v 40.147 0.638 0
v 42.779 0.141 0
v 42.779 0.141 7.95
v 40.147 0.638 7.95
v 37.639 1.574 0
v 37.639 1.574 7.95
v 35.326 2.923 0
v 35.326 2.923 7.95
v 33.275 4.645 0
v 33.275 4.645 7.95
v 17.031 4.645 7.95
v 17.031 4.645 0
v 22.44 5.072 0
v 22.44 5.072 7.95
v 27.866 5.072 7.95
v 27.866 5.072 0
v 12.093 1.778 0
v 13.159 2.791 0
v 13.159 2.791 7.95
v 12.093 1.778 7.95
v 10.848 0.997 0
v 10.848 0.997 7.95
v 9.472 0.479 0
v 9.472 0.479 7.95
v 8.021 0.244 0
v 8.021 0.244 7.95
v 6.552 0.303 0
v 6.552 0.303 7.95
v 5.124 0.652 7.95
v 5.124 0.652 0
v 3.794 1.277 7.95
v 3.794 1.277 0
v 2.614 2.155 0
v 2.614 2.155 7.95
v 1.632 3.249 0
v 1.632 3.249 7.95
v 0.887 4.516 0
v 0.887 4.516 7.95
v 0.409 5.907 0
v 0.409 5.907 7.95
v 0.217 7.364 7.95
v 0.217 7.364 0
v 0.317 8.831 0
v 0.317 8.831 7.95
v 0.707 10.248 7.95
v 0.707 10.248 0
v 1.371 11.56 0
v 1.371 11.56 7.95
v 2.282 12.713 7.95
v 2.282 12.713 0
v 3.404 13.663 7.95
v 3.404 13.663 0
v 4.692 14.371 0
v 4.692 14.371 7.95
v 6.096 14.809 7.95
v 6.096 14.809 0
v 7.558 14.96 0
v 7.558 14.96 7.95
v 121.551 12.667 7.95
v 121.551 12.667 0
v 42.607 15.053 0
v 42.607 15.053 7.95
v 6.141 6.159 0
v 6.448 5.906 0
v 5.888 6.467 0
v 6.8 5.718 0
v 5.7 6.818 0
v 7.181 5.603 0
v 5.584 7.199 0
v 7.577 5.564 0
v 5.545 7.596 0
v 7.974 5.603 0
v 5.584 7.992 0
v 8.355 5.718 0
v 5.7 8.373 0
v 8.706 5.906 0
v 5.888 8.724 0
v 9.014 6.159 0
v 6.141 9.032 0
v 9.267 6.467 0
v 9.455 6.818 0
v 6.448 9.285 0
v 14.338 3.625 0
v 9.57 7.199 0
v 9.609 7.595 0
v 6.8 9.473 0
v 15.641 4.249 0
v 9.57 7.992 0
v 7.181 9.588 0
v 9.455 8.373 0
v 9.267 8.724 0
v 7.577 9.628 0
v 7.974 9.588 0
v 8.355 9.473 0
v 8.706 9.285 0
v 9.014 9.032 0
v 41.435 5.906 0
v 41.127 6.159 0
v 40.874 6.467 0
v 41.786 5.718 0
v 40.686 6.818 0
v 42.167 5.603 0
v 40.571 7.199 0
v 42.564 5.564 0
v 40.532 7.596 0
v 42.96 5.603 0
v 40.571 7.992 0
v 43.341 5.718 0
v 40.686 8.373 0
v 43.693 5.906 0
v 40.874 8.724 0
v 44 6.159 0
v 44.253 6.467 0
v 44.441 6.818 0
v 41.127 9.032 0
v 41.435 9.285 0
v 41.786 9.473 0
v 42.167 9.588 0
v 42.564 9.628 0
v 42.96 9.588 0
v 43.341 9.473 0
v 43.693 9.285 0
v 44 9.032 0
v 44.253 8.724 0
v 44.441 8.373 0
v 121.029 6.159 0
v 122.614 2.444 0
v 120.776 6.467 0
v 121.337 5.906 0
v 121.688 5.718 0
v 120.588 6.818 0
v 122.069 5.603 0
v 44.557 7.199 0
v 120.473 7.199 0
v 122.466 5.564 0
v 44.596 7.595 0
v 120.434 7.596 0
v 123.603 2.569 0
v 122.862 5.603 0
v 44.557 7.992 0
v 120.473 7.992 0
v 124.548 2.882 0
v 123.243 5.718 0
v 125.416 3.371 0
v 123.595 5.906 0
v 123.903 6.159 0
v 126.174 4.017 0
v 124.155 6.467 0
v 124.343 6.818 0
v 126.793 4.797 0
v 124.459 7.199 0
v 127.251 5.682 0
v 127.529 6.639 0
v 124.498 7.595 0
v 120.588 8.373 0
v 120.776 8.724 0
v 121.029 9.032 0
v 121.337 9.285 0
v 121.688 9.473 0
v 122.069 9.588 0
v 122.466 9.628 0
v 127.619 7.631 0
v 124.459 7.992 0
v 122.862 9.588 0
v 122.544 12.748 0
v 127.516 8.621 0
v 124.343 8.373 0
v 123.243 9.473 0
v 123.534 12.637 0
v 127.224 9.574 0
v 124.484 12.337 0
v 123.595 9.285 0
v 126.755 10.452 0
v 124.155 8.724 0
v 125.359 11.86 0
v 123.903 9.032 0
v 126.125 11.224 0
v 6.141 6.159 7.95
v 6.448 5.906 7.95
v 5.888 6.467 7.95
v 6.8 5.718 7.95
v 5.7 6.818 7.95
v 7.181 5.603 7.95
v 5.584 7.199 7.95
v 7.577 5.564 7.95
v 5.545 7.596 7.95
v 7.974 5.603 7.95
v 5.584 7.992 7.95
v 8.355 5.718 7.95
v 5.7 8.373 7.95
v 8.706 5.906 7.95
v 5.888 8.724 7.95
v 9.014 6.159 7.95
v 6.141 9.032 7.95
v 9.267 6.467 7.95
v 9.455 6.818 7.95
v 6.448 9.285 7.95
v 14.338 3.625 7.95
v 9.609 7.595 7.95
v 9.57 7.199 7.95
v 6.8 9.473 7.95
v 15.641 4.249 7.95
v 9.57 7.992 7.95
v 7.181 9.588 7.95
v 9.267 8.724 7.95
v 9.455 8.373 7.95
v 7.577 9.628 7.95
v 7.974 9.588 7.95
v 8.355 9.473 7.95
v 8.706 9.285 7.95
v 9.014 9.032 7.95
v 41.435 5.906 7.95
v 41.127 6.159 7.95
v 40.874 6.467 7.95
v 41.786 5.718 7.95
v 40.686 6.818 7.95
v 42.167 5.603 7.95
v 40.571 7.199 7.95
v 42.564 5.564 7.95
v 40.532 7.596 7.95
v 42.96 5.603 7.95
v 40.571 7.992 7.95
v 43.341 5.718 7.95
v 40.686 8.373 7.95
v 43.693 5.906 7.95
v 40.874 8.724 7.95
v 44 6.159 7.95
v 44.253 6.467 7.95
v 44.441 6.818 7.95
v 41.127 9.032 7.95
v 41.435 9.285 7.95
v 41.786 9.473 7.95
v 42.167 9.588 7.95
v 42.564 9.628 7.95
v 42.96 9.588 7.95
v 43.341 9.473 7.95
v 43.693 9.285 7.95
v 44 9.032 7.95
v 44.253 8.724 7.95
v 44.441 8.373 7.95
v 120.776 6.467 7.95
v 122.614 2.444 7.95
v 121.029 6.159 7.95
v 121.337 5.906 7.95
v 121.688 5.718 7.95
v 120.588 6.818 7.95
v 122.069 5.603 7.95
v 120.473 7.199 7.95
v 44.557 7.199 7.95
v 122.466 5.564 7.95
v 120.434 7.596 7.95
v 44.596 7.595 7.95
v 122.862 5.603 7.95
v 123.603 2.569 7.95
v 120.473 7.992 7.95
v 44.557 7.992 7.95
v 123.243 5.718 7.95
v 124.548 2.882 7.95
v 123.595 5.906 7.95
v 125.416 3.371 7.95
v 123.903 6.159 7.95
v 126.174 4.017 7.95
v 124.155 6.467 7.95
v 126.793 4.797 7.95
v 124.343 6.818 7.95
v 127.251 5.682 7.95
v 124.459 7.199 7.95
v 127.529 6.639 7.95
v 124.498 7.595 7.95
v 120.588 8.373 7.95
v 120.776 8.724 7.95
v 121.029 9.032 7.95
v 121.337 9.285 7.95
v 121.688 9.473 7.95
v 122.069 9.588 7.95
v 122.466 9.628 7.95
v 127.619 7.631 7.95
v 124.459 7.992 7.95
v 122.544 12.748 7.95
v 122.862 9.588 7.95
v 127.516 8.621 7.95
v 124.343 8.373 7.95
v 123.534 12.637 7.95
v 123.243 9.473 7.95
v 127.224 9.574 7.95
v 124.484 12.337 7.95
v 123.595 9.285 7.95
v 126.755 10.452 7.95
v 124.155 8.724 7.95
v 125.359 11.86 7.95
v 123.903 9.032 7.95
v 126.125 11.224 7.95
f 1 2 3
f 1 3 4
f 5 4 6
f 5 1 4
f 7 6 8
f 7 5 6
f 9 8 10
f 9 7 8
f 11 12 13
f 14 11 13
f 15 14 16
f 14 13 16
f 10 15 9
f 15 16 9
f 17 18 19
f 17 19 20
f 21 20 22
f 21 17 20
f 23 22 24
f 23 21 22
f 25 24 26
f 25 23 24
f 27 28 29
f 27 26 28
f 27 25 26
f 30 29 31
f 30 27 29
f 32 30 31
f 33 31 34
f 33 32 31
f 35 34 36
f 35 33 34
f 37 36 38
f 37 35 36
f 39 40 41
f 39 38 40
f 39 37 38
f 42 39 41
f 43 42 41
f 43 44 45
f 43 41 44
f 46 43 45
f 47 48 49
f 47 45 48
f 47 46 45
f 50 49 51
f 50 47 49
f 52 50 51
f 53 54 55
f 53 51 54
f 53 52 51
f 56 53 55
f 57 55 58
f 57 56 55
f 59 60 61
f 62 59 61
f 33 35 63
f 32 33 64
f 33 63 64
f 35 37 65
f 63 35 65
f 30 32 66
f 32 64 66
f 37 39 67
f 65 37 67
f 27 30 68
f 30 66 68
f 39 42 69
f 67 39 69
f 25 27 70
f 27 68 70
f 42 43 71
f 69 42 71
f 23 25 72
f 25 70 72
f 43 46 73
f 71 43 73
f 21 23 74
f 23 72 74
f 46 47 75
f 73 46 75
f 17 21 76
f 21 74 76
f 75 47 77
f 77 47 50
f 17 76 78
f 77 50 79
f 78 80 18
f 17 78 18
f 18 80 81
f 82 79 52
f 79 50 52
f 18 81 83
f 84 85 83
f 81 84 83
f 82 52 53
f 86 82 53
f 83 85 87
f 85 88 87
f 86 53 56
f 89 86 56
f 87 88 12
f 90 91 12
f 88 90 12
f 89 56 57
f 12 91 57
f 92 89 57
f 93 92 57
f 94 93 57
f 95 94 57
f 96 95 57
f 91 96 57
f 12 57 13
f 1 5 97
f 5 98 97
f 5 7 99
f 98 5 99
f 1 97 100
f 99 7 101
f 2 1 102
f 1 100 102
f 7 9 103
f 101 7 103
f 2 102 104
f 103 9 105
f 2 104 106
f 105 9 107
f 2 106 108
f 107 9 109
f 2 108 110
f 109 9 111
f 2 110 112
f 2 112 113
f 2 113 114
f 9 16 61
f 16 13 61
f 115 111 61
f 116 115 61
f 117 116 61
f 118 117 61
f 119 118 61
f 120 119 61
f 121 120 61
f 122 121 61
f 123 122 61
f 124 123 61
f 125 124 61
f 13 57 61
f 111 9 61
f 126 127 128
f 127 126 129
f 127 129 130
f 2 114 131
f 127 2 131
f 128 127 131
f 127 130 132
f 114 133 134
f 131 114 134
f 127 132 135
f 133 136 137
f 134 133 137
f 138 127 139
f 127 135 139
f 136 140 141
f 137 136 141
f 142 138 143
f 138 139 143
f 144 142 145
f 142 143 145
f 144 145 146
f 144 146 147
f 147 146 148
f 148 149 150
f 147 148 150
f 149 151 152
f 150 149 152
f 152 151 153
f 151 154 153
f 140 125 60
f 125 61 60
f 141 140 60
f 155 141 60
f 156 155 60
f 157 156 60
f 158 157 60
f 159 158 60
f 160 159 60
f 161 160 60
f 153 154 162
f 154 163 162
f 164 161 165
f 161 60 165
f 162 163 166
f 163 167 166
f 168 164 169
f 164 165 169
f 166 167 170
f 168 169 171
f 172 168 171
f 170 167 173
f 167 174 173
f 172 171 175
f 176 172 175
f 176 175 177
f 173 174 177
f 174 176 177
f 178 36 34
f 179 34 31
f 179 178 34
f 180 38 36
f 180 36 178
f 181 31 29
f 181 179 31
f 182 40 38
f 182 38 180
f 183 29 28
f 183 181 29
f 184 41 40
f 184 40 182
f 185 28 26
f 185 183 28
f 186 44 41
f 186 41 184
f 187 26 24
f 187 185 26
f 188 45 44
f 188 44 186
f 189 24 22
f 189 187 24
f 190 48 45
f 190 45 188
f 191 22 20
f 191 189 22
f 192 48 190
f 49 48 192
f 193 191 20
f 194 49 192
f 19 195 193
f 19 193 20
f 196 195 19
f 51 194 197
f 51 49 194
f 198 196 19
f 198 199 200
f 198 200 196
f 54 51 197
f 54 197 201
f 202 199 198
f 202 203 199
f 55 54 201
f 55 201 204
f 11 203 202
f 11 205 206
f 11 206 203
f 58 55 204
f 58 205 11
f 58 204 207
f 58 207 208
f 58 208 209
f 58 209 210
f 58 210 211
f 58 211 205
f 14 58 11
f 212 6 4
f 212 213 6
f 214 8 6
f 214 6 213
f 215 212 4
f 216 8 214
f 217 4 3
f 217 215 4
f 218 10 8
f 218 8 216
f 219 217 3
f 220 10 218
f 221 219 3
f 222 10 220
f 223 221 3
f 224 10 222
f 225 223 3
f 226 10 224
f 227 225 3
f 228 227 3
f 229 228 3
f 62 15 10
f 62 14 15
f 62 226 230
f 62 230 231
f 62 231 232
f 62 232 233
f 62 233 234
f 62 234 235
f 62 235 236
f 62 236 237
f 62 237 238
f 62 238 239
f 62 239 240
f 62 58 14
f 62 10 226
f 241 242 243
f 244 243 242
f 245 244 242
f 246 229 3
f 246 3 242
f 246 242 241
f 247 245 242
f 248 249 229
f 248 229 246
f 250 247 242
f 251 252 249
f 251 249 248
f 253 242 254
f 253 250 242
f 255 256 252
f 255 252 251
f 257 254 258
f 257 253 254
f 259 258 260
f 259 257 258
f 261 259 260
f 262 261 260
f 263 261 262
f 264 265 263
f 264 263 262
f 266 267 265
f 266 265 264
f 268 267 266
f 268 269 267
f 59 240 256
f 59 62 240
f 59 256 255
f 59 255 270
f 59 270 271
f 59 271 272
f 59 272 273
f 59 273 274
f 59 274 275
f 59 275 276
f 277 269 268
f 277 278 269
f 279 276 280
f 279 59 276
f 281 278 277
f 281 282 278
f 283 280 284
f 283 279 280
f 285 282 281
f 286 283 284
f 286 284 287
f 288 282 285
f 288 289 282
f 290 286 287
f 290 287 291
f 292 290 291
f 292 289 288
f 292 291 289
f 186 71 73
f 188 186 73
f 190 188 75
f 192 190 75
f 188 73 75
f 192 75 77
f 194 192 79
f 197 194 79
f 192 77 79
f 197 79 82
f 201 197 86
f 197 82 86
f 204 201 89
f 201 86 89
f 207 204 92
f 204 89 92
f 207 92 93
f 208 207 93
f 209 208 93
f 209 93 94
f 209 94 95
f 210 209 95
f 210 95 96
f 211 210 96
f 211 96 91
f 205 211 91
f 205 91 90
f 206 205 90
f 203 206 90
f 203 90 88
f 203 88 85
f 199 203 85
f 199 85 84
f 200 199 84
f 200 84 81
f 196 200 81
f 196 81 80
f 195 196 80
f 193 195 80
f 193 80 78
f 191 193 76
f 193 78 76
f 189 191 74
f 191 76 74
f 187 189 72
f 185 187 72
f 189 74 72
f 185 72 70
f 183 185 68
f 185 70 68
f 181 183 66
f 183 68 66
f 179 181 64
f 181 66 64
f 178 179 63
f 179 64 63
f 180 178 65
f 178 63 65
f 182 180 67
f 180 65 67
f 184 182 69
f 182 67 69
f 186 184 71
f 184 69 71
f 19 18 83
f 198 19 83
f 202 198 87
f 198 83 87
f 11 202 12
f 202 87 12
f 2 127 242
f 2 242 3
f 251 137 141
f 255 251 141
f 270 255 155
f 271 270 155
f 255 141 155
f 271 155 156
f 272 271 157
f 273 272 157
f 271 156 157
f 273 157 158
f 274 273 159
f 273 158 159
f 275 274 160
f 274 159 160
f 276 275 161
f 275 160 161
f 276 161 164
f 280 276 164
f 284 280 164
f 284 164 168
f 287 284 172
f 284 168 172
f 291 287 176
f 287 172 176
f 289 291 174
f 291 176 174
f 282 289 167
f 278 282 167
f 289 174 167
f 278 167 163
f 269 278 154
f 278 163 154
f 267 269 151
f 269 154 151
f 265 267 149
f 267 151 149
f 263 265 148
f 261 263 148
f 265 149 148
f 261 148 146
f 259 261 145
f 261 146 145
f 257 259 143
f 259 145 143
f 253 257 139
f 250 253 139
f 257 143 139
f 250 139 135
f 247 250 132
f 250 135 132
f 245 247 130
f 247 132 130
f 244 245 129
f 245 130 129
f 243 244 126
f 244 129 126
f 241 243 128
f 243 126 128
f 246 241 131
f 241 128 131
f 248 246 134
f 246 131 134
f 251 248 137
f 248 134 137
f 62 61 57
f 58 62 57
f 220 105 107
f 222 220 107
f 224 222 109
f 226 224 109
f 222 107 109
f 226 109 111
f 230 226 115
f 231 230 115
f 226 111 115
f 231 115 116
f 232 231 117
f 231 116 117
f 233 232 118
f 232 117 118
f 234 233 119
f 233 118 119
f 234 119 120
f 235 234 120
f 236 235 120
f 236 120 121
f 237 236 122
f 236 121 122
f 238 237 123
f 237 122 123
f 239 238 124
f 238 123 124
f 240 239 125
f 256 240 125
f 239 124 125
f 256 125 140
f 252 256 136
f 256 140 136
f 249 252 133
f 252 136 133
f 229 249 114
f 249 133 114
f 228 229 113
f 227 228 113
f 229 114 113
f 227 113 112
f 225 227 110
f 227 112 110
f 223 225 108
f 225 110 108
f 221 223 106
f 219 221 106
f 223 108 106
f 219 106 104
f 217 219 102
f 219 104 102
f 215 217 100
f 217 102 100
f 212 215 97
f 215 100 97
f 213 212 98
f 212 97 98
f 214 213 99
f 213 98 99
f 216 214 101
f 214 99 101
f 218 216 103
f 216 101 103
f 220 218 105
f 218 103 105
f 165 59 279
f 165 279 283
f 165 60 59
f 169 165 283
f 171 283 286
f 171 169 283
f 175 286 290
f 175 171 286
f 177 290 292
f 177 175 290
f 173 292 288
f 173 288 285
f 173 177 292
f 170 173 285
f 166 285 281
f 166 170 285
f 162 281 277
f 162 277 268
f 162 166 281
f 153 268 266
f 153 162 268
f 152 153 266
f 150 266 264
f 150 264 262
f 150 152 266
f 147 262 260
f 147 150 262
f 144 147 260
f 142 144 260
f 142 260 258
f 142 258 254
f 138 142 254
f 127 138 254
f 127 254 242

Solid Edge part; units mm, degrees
sketch "Sketch1" plane through (0, 0, 0) normal (0, 0, -1) x (-1, 0, 0)
  circle A0 centre (-7.5774, 7.5955) radius 2.032
  circle A1 centre (-42.5636, 7.5955) radius 2.032
  circle A2 centre (-122.4658, 7.5955) radius 2.032
  line L0 (-121.5515, 12.6669) -> (-42.6073, 15.0526)
  line L1 (-42.6073, 15.0526) -> (-7.5579, 14.9599)
  arc A3 (-7.5579, 14.9599) -> (-13.1588, 2.7909) centre (-7.5774, 7.5955) cw
  arc A4 (-17.0309, 4.6448) -> (-13.1588, 2.7909) centre (-18.673, -3.7556) cw
  arc A5 (-33.2754, 4.6448) -> (-17.0309, 4.6448) centre (-25.1531, -63.7101) cw
  arc A6 (-42.7786, 0.1413) -> (-33.2754, 4.6448) centre (-44.3624, 15.762) ccw
  line L2 (-122.6144, 2.4444) -> (-42.7786, 0.1413)
  arc A7 (-121.5515, 12.6669) -> (-122.6144, 2.4444) centre (-122.4658, 7.5955) ccw
extrude "Protrusion1" add sketch "Sketch1" against normal blind 7.9502
properties part number "AC_1.07"
